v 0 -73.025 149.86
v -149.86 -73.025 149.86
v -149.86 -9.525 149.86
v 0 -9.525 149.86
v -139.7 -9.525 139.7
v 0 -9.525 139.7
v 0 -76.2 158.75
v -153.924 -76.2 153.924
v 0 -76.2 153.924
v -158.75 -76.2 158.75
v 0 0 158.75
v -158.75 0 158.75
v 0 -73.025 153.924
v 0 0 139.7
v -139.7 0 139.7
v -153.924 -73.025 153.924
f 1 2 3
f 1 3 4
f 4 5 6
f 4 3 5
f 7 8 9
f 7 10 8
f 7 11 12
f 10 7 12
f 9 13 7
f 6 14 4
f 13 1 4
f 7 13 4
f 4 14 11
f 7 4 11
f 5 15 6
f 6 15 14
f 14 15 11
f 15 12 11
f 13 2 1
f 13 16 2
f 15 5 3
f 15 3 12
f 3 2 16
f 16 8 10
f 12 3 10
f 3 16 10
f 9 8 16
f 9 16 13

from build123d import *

# Parameters (mm, degrees)
F1_DEPTH = 76.2
F2_W     = 153.924
F2_H     = 153.924
F3_DEPTH = 3.175
F4_W     = 149.86
F4_H     = 149.86
F5_DEPTH = 63.5
F7_DEPTH = 76.201


# Not quite as in the source:
# - a feature names something its author has since deleted; it is built from what else it names


with BuildPart() as f1:
    # F0 (on Front) → F1 (new body)
    with BuildSketch(Plane.XZ):
        Polygon((0, 139.7), (0, 158.75), (-158.75, 158.75), (-158.75, 0), (-139.7, 0), (-139.7, 139.7), align=None)
    extrude(amount=F1_DEPTH)

    # F2 (on face) → F3 (cut)
    with BuildSketch(Plane.XZ.offset(76.2)):
        with Locations((-76.962, 76.962)):
            Rectangle(F2_W, F2_H)
    extrude(amount=-F3_DEPTH, mode=Mode.SUBTRACT)

    # F4 (on face) → F5 (cut)
    with BuildSketch(Plane.XZ.offset(73.025)):
        with Locations((-74.93, 74.93)):
            Rectangle(F4_W, F4_H)
    extrude(amount=-F5_DEPTH, mode=Mode.SUBTRACT)

    # F6 (on face) → F7 (cut, through all)
    with BuildSketch(Plane.XZ.offset(76.2)):
        Polygon((-139.7, 139.7), (-158.75, 158.75), (-158.75, 0), (-139.7, 0), align=None)
    extrude(amount=-F7_DEPTH, mode=Mode.SUBTRACT)


solid = f1.part
